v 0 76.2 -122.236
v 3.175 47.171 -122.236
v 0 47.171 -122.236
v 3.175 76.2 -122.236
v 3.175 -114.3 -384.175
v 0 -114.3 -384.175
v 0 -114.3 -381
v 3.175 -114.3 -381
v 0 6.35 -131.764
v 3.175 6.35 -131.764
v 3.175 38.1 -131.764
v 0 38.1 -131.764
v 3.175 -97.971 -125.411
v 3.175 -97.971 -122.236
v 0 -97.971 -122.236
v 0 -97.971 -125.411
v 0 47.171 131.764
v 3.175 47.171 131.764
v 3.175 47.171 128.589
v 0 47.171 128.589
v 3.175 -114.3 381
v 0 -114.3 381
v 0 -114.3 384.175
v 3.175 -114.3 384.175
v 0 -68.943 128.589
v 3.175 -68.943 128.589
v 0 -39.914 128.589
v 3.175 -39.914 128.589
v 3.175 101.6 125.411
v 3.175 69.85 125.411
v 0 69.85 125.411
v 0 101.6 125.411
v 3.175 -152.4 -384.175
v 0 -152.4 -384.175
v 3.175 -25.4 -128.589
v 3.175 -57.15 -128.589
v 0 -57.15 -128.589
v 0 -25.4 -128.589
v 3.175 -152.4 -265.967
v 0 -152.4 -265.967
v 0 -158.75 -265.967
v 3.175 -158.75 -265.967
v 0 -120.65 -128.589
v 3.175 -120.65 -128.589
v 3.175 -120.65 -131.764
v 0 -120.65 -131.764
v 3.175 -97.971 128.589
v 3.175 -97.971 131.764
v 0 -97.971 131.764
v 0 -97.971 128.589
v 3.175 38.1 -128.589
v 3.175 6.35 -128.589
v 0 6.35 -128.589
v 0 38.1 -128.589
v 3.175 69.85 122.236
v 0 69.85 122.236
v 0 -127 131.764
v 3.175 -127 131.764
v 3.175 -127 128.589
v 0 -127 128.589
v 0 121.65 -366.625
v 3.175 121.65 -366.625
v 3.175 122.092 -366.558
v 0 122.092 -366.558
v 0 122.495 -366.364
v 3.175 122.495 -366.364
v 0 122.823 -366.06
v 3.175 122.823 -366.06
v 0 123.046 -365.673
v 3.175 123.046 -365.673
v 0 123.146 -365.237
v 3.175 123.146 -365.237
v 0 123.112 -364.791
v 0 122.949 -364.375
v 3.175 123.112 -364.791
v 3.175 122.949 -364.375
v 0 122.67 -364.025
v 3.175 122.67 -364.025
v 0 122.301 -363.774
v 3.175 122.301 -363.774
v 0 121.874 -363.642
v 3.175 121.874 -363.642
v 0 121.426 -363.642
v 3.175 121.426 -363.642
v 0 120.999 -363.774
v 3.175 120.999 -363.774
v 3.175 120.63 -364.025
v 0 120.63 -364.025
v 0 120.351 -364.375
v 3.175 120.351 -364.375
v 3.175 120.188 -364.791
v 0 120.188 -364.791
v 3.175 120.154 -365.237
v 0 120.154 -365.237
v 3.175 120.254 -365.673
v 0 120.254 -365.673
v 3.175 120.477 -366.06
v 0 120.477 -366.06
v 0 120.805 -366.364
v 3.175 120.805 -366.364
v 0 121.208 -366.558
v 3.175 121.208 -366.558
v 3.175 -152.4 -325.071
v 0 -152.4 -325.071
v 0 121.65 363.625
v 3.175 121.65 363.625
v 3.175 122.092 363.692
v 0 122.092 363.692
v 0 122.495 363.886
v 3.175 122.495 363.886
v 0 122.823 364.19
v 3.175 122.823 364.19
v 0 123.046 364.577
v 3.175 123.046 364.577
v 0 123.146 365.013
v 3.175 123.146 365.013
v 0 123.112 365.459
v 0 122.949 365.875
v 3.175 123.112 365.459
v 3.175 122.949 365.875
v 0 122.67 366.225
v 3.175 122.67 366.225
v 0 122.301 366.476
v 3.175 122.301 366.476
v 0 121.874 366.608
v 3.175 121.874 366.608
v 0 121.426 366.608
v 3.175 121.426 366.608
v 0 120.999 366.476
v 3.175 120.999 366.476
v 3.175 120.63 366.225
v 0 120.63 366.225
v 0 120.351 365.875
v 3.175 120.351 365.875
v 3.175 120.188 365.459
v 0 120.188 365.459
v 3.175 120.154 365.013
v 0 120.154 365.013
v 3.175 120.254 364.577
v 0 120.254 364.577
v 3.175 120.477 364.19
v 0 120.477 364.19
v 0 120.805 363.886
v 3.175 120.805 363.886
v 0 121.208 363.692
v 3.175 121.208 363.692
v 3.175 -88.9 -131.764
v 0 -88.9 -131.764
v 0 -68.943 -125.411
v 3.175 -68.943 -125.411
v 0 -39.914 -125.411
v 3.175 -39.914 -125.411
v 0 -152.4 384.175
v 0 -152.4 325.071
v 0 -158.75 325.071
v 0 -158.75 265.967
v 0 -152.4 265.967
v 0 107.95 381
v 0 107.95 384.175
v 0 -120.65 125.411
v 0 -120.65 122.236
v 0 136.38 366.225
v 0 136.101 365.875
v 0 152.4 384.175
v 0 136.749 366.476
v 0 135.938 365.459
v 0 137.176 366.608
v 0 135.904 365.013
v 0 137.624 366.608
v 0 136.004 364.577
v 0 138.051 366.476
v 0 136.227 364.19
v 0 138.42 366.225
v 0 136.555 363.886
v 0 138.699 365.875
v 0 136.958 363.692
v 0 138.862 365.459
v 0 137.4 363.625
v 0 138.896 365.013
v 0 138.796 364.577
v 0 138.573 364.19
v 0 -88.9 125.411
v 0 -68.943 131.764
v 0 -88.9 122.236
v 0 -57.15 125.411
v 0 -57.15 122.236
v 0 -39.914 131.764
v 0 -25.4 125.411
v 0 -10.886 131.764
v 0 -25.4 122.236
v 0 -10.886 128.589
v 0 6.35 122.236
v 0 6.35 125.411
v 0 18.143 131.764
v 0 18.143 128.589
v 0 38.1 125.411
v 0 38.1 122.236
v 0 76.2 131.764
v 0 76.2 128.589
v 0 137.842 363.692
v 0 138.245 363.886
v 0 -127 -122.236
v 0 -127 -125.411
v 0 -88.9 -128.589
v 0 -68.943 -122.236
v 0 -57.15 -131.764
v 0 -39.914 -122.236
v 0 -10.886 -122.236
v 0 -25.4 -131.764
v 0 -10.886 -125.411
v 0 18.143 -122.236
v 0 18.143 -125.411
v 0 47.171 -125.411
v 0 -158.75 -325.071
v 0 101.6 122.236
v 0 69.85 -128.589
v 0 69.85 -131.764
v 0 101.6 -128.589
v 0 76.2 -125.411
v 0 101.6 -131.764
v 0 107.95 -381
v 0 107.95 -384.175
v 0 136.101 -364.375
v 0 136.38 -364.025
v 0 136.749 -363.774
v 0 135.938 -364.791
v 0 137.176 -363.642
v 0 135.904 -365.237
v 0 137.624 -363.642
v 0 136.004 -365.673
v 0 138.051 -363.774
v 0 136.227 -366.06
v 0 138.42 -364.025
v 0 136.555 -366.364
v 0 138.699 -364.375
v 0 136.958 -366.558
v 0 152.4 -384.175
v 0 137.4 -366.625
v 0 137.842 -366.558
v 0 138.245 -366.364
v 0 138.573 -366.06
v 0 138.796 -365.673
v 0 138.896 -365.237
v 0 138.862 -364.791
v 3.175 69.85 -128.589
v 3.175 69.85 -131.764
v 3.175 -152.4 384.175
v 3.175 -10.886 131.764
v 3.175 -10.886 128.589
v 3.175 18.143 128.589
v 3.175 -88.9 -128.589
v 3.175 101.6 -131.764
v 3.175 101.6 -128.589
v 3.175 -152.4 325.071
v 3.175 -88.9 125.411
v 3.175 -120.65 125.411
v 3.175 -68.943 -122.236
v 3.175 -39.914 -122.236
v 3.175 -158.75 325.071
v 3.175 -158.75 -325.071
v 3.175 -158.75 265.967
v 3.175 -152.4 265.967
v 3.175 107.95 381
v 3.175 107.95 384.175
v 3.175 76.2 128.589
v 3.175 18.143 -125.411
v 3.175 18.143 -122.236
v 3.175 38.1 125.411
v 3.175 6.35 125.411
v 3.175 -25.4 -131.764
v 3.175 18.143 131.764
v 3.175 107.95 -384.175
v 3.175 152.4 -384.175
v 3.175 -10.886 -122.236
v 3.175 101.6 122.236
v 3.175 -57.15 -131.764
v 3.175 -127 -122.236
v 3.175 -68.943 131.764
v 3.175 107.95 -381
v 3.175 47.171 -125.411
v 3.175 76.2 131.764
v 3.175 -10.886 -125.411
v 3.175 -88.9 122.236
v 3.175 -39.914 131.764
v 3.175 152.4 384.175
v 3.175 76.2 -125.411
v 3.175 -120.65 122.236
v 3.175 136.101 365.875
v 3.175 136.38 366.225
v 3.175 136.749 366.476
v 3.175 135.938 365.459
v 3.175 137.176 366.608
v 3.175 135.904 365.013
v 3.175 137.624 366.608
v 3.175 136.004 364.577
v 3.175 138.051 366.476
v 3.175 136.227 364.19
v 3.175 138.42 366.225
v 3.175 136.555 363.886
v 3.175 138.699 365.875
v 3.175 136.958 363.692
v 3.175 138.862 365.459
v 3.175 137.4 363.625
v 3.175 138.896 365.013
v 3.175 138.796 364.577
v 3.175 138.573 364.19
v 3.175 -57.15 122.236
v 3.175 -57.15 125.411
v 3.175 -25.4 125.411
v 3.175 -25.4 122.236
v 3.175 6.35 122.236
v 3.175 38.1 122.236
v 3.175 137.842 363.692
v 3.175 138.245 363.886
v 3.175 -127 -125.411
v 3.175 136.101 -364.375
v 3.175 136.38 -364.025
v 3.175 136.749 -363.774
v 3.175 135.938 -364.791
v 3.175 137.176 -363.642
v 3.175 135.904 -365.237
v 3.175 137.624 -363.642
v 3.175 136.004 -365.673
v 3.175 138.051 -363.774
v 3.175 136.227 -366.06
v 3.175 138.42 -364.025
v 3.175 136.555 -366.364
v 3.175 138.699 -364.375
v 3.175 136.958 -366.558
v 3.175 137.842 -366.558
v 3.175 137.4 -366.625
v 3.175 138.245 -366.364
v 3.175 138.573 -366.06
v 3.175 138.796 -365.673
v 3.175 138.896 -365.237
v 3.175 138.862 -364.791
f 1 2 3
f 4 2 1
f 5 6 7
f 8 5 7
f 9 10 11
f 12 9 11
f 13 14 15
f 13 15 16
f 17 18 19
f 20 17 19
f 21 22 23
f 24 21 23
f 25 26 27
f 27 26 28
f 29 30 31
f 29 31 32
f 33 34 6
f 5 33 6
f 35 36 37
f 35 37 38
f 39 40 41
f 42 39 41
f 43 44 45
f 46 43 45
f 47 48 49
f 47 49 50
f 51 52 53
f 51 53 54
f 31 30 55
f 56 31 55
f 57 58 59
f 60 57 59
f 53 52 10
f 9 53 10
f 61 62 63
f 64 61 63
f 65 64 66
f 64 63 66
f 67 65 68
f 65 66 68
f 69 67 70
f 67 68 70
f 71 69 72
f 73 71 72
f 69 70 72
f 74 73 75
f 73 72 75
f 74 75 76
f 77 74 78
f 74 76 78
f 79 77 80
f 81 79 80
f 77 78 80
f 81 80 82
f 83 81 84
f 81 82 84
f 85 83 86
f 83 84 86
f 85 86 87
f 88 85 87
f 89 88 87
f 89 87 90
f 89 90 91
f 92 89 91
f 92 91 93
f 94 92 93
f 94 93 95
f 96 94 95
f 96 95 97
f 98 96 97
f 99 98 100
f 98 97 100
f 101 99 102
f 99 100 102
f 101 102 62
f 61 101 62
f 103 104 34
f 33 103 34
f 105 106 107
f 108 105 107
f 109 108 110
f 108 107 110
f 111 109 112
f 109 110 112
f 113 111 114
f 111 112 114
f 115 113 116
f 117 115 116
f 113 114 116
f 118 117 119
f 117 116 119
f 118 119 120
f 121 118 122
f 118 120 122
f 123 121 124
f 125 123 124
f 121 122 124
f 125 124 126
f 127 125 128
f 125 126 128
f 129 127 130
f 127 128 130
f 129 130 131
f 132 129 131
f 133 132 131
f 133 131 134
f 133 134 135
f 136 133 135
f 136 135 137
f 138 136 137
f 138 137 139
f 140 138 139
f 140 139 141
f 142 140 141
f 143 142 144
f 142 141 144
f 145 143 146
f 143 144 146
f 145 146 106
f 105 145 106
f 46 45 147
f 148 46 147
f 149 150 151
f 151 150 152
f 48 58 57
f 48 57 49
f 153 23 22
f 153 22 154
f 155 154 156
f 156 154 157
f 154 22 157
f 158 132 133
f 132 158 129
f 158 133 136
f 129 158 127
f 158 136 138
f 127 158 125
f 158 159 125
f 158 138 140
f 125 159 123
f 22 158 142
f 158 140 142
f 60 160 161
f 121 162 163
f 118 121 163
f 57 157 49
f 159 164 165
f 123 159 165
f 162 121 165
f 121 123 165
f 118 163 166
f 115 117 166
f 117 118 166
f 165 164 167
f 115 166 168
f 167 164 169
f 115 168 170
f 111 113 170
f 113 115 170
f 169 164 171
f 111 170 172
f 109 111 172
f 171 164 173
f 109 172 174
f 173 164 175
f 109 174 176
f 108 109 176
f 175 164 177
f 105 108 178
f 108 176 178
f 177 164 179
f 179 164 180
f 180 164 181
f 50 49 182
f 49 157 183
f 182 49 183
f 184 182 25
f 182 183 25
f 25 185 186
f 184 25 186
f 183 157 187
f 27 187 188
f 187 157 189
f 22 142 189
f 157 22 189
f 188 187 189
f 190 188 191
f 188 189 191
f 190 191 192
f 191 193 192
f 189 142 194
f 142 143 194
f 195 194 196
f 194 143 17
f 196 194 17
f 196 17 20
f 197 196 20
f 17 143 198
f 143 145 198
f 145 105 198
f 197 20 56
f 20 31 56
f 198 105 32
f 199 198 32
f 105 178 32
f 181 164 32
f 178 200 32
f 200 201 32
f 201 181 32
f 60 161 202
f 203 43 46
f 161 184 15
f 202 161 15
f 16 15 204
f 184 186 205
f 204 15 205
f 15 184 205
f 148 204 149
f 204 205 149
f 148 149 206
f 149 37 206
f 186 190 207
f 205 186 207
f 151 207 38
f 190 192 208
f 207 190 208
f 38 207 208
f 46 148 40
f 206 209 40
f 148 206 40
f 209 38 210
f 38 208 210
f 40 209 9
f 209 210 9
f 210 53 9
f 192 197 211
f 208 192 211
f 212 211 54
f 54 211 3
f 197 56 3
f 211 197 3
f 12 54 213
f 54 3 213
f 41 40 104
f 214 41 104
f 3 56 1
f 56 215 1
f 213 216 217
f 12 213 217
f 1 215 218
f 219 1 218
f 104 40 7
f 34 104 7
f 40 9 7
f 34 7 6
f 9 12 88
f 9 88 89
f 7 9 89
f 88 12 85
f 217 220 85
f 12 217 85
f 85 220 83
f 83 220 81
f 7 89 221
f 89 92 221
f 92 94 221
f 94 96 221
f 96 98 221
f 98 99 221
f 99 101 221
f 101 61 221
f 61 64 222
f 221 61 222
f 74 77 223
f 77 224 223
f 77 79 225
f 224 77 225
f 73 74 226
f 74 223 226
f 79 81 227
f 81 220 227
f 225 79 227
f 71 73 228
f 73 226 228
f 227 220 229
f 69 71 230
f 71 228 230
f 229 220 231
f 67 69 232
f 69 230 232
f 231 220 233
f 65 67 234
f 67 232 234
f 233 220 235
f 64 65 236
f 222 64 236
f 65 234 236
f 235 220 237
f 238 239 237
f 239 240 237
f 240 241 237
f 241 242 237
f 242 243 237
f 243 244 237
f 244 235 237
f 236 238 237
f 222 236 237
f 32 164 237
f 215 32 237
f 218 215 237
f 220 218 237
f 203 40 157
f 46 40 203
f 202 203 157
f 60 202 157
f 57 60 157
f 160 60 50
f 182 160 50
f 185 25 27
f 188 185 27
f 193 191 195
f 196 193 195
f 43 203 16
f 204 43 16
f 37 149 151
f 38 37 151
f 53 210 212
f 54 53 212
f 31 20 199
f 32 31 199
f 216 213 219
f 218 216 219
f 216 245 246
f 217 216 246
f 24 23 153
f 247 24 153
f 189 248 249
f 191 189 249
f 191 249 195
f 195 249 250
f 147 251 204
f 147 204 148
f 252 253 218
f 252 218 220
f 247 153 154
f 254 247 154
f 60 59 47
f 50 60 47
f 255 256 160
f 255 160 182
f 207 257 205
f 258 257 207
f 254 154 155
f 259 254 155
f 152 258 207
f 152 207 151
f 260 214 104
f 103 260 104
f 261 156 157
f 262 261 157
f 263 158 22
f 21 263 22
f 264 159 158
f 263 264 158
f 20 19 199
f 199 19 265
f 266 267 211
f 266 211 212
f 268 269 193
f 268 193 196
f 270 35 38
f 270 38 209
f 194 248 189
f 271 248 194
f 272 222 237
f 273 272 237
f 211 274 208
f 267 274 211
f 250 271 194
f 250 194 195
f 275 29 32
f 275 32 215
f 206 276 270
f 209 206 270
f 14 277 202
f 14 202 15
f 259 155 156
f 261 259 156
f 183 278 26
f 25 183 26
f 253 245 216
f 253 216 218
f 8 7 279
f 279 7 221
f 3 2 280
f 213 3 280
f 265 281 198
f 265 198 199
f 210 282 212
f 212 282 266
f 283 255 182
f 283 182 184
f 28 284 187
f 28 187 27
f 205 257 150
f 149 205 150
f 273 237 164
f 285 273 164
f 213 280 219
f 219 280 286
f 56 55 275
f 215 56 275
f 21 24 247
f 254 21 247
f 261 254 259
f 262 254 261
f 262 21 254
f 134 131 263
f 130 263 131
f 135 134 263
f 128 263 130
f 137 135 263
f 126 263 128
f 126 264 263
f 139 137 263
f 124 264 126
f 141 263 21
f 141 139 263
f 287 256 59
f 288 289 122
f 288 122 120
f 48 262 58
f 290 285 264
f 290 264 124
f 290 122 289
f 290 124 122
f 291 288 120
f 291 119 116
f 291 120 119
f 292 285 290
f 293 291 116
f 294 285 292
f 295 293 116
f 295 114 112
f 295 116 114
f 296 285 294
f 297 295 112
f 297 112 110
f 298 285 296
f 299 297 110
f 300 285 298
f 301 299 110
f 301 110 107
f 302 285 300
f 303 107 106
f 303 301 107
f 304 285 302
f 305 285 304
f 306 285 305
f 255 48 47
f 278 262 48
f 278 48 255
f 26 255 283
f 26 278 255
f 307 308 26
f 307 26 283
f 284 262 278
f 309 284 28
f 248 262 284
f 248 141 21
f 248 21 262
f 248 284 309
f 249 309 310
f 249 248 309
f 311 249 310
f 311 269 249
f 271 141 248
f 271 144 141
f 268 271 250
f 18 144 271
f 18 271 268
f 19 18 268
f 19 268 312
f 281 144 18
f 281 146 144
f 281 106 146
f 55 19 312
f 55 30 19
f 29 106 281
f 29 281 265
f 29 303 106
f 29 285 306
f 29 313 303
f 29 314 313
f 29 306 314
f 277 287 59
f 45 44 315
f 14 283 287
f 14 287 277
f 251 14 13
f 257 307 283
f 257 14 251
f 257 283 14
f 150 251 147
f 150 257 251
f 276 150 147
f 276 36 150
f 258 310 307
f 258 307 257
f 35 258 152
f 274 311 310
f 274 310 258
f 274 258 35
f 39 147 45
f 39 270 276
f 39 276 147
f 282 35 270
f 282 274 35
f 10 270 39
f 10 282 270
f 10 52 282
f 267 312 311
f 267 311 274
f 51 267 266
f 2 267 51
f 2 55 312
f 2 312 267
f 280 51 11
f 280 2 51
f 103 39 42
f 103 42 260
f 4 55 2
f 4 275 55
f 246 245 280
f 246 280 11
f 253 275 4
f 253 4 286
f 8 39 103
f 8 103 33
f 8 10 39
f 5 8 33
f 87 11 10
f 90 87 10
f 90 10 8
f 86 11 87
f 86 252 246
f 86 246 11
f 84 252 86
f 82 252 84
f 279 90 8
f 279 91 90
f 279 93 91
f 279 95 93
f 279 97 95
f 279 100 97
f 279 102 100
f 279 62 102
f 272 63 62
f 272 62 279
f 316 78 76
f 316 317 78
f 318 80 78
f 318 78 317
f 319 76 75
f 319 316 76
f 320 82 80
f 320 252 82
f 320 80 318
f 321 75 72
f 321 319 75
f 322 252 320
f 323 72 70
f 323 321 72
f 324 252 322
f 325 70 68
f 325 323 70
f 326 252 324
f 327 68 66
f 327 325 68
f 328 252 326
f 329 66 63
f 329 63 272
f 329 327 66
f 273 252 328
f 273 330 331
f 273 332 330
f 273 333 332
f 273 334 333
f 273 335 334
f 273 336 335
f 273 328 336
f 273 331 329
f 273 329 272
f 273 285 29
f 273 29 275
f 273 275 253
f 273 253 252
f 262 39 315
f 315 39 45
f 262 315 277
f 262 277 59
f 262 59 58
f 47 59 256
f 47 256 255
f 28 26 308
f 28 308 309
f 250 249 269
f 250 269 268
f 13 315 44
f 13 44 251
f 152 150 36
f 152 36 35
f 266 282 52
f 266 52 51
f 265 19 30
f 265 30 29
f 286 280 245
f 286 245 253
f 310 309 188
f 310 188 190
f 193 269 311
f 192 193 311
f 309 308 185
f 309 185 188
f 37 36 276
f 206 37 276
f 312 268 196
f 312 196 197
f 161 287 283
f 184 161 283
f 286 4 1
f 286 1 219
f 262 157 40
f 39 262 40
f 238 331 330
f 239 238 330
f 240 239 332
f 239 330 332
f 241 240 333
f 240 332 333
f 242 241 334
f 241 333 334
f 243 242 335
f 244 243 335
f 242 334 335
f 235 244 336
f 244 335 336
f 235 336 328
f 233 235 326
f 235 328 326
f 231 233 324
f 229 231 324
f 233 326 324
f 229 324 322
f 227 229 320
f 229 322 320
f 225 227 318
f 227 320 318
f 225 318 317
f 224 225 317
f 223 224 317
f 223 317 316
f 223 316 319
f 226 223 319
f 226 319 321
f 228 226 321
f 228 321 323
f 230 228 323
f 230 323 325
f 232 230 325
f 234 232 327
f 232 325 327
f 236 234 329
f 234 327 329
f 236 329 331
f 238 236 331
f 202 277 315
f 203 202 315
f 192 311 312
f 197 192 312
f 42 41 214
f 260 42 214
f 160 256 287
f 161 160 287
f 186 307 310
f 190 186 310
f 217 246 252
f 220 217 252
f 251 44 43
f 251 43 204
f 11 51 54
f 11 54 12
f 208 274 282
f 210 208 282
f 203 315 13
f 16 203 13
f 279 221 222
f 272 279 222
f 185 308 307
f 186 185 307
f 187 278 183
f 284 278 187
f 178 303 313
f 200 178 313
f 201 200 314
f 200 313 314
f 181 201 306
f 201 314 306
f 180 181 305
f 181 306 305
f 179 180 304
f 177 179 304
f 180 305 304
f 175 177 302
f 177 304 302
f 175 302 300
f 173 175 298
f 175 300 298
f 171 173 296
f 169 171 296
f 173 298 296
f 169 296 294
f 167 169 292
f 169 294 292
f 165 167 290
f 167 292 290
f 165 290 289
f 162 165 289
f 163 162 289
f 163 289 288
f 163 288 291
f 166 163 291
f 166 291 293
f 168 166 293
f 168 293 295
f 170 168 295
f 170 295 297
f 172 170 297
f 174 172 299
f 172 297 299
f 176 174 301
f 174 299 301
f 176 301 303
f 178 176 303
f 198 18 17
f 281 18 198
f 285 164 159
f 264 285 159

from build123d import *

# Parameters (mm, degrees)
BOSS_EXTRUDE1_DEPTH = 3.175
SKETCH3_W           = 3.175
SKETCH3_H           = 31.75
SKETCH3_H_2         = 29.028571429
CUT_EXTRUDE1_DEPTH  = 416.694688143
SKETCH4_R           = 1.5
CUT_EXTRUDE2_DEPTH  = 3.175
SKETCH5_W           = 3.175
SKETCH5_H           = 44.45
SKETCH5_W_2         = 59.103846153
SKETCH5_H_2         = 6.35
SKETCH5_W_3         = 59.103846154
CUT_EXTRUDE3_DEPTH  = 3.175


with BuildPart() as part:
    # Sketch1 → Boss-Extrude1 (new body)
    with BuildSketch(Plane(origin=(0, 0, 0), x_dir=(0, 0, -1), z_dir=(1, 0, 0))):
        Polygon((-384.175, 152.4), (-384.175, 107.95), (-381, 107.95), (-381, 63.5), (-384.175, 63.5), (-384.175, 19.05), (-381, 19.05), (-381, -25.4), (-384.175, -25.4), (-384.175, -69.85), (-381, -69.85), (-381, -114.3), (-384.175, -114.3), (-384.175, -152.4), (-325.071153846, -152.4), (-325.071153846, -158.75), (-265.967307692, -158.75), (-265.967307692, -152.4), (-206.863461538, -152.4), (-206.863461538, -158.75), (-147.759615385, -158.75), (-147.759615385, -152.4), (-88.655769231, -152.4), (-88.655769231, -158.75), (-29.551923077, -158.75), (-29.551923077, -152.4), (29.551923077, -152.4), (29.551923077, -158.75), (88.655769231, -158.75), (88.655769231, -152.4), (147.759615385, -152.4), (147.759615385, -158.75), (206.863461538, -158.75), (206.863461538, -152.4), (265.967307692, -152.4), (265.967307692, -158.75), (325.071153846, -158.75), (325.071153846, -152.4), (384.175, -152.4), (384.175, -114.3), (381, -114.3), (381, -69.85), (384.175, -69.85), (384.175, -25.4), (381, -25.4), (381, 19.05), (384.175, 19.05), (384.175, 63.5), (381, 63.5), (381, 107.95), (384.175, 107.95), (384.175, 152.4), align=None)
    extrude(amount=BOSS_EXTRUDE1_DEPTH)

    # Sketch3 → Cut-Extrude1 (cut, through all)
    with BuildSketch(Plane(origin=(3.175, 0, 0), x_dir=(0, 0, -1), z_dir=(1, 0, 0))):
        with Locations((-123.823769685, -104.775)):
            Rectangle(SKETCH3_W, SKETCH3_H)
        with Locations((-123.823769685, -41.275)):
            Rectangle(SKETCH3_W, SKETCH3_H)
        with Locations((-123.823769685, 22.225)):
            Rectangle(SKETCH3_W, SKETCH3_H)
        with Locations((-123.823769685, 85.725)):
            Rectangle(SKETCH3_W, SKETCH3_H)
        with Locations((-130.176230315, 61.685714285)):
            Rectangle(SKETCH3_W, SKETCH3_H_2)
        with Locations((-130.176230315, 3.628571428)):
            Rectangle(SKETCH3_W, SKETCH3_H_2)
        with Locations((-130.176230315, -54.428571428)):
            Rectangle(SKETCH3_W, SKETCH3_H_2)
        with Locations((-130.176230315, -112.485714286)):
            Rectangle(SKETCH3_W, SKETCH3_H_2)
        with Locations((130.176230315, 85.725)):
            Rectangle(SKETCH3_W, SKETCH3_H)
        with Locations((123.823769685, 61.685714285)):
            Rectangle(SKETCH3_W, SKETCH3_H_2)
        with Locations((130.176230315, 22.225)):
            Rectangle(SKETCH3_W, SKETCH3_H)
        with Locations((123.823769685, 3.628571428)):
            Rectangle(SKETCH3_W, SKETCH3_H_2)
        with Locations((130.176230315, -41.275)):
            Rectangle(SKETCH3_W, SKETCH3_H)
        with Locations((123.823769685, -54.428571428)):
            Rectangle(SKETCH3_W, SKETCH3_H_2)
        with Locations((130.176230315, -104.775)):
            Rectangle(SKETCH3_W, SKETCH3_H)
        with Locations((123.823769685, -112.485714286)):
            Rectangle(SKETCH3_W, SKETCH3_H_2)
    extrude(amount=-CUT_EXTRUDE1_DEPTH, mode=Mode.SUBTRACT)

    # Sketch4 → Cut-Extrude2 (cut)
    with BuildSketch(Plane(origin=(3.175, 0, 0), x_dir=(0, 0, -1), z_dir=(1, 0, 0))):
        with Locations((-365.125, 137.4)):
            Circle(SKETCH4_R)
        with Locations((-365.125, 121.65)):
            Circle(SKETCH4_R)
        with Locations((365.125, 137.4)):
            Circle(SKETCH4_R)
        with Locations((365.125, 121.65)):
            Circle(SKETCH4_R)
    extrude(amount=-CUT_EXTRUDE2_DEPTH, mode=Mode.SUBTRACT)

    # Sketch5 → Cut-Extrude3 (cut)
    with BuildSketch(Plane(origin=(3.175, 0, 0), x_dir=(0, 0, -1), z_dir=(1, 0, 0))):
        with Locations((-382.5875, 41.275)):
            Rectangle(SKETCH5_W, SKETCH5_H)
        with Locations((-382.5875, -47.625)):
            Rectangle(SKETCH5_W, SKETCH5_H)
        with Locations((-177.311538462, -155.575)):
            Rectangle(SKETCH5_W_2, SKETCH5_H_2)
        with Locations((-59.103846154, -155.575)):
            Rectangle(SKETCH5_W_3, SKETCH5_H_2)
        with Locations((59.103846154, -155.575)):
            Rectangle(SKETCH5_W_3, SKETCH5_H_2)
        with Locations((177.311538462, -155.575)):
            Rectangle(SKETCH5_W_2, SKETCH5_H_2)
        with Locations((382.5875, -47.625)):
            Rectangle(SKETCH5_W, SKETCH5_H)
        with Locations((382.5875, 41.275)):
            Rectangle(SKETCH5_W, SKETCH5_H)
    extrude(amount=-CUT_EXTRUDE3_DEPTH, mode=Mode.SUBTRACT)


solid = part.part
